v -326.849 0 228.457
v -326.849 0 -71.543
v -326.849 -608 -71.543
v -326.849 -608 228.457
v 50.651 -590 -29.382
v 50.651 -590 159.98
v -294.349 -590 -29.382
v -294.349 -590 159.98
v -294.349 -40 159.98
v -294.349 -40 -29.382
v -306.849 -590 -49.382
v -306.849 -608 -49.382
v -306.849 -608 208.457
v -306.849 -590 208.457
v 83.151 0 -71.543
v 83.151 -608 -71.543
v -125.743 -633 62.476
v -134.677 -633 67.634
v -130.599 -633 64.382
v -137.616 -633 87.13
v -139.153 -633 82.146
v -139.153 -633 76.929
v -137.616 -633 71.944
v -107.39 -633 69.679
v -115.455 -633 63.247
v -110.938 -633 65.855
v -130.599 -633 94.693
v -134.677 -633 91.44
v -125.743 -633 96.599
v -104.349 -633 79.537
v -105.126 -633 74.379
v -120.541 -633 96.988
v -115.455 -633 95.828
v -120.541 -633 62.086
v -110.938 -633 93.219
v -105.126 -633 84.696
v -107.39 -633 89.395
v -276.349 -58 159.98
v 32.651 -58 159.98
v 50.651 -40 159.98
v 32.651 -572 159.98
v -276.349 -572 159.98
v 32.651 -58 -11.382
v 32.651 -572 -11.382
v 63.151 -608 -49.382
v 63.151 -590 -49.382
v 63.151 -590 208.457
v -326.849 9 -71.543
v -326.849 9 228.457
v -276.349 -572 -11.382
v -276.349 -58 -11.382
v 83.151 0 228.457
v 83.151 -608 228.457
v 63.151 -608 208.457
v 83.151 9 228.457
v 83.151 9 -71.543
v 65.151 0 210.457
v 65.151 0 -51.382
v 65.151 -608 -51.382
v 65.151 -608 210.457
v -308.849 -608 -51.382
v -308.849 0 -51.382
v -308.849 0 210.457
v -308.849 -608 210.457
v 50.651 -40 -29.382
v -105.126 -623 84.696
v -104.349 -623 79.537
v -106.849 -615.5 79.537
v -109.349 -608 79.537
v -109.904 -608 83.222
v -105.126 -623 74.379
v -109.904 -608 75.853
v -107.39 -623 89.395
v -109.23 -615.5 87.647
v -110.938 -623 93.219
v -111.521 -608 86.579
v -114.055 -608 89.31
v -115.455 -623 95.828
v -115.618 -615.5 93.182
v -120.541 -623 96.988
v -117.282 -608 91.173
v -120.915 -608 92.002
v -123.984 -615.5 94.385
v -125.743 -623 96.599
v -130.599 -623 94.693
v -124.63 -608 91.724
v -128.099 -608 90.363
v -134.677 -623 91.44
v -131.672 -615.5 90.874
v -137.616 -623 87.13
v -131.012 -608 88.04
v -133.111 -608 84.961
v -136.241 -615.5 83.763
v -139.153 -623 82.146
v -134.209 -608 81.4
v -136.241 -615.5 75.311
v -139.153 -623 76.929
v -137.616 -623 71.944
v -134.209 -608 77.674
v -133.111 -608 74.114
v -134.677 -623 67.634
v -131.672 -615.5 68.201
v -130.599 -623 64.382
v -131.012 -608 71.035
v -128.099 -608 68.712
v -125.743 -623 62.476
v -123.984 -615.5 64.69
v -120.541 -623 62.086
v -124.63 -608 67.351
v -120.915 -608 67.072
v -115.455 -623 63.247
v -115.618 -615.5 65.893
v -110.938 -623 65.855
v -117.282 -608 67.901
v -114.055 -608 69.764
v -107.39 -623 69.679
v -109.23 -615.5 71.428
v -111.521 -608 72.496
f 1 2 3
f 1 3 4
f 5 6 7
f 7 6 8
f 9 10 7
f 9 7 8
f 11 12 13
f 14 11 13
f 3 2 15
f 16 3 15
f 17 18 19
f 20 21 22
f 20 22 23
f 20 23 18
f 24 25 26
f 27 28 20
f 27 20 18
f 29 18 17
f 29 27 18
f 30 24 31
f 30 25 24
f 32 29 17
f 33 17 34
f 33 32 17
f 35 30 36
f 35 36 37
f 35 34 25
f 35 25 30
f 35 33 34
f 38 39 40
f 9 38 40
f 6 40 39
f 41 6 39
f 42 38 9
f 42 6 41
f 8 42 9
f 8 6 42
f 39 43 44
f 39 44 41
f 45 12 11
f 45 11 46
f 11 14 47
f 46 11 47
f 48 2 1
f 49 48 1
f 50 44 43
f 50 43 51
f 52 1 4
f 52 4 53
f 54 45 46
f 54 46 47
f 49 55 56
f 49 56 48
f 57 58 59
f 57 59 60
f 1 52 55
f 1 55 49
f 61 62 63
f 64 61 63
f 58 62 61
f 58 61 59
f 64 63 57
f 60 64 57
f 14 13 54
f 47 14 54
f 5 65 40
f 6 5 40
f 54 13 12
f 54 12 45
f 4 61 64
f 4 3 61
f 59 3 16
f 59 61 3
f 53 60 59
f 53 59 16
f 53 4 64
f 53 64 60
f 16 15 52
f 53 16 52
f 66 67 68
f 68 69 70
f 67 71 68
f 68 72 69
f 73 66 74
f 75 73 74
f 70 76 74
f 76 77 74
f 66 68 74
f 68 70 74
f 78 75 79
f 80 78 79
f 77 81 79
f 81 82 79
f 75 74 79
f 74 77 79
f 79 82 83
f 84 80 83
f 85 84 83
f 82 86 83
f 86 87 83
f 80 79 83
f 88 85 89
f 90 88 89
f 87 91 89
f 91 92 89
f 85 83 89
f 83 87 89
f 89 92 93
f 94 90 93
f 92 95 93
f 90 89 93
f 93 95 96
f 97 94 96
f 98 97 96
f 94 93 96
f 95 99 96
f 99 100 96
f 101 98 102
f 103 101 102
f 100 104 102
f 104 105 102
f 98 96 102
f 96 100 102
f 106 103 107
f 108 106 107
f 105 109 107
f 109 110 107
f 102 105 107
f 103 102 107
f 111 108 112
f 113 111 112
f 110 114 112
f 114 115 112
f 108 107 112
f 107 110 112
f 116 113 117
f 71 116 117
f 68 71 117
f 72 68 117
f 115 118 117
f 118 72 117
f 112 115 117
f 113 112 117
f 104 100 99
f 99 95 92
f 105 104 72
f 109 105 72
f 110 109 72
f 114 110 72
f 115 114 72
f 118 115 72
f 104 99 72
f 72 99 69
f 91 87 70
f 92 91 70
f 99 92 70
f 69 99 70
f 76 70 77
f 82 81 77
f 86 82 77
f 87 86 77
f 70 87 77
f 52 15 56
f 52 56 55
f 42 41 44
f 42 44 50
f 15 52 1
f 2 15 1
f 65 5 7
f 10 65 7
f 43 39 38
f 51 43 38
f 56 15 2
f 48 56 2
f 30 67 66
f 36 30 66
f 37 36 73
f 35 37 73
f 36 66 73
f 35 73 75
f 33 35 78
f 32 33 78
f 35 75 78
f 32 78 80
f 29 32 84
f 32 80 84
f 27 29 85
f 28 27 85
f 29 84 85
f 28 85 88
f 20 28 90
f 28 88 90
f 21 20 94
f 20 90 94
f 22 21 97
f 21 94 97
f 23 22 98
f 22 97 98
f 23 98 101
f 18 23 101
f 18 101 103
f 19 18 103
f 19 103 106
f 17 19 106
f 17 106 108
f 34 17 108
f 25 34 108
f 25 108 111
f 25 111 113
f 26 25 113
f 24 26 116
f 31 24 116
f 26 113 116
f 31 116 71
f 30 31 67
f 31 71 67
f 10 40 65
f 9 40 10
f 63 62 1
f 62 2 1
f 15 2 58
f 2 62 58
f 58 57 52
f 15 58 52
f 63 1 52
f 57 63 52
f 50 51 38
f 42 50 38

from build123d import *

# Parameters (mm, degrees)
F0_W      = 410
F0_H      = 300
F0_W_2    = 374
F0_H_2    = 261.838547
F1_DEPTH  = 608
F2_W      = 410
F2_H      = 300
F3_DEPTH  = 9
F4_W      = 370
F4_H      = 257.838547
F5_DEPTH  = 18
F6_W      = 345
F6_H      = 189.362255
F7_DEPTH  = 550
F8_T      = -18
F9_R      = 17.5
F10_DEPTH = 25
F11_SIZE2 = 5
F11_SIZE  = 15


with BuildPart() as f1:
    # F0 (on Front) → F1 (new body)
    with BuildSketch(Plane.XZ):
        with Locations((-121.848952, 78.456648)):
            Rectangle(F0_W, F0_H)
        with Locations((-121.848952, 79.537374)):
            Rectangle(F0_W_2, F0_H_2, mode=Mode.SUBTRACT)
    extrude(amount=F1_DEPTH)


with BuildPart() as f3:
    # F2 (on face) → F3 (new body)
    with BuildSketch(Plane(origin=(0, 0, 0), x_dir=(-1, 0, 0), z_dir=(0, 1, 0))):
        with Locations((121.848952, 78.456648)):
            Rectangle(F2_W, F2_H)
    extrude(amount=F3_DEPTH)


with BuildPart() as f5:
    # F4 (on face) → F5 (new body)
    with BuildSketch(Plane.XZ.offset(608)):
        with Locations((-121.848952, 79.537374)):
            Rectangle(F4_W, F4_H)
    extrude(amount=-F5_DEPTH)


with BuildPart() as f7:
    # F6 (on face) → F7 (new body)
    with BuildSketch(Plane(origin=(0, -590, 0), x_dir=(-1, 0, 0), z_dir=(0, 1, 0))):
        with Locations((121.848952, 65.299228)):
            Rectangle(F6_W, F6_H)
    extrude(amount=F7_DEPTH)

    # F8
    f8_openings = [f7.faces().sort_by_distance(p)[0] for p in [
        (-121.848952, -315, 159.980356),
    ]]
    offset(amount=F8_T, openings=f8_openings)


with BuildPart() as f10:
    # F9 (on face) → F10 (new body)
    with BuildSketch(Plane.XZ.offset(608)):
        with Locations((-121.848952, 79.537374)):
            Circle(F9_R)
    extrude(amount=F10_DEPTH)

    # F11
    f11_edges = [f10.edges().sort_by_distance(p)[0] for p in [
        (-139.348952, -608, 79.537374),
    ]]
    chamfer(f11_edges, length=F11_SIZE, length2=F11_SIZE2)


solid = Compound([f1.part, f3.part, f5.part, f7.part, f10.part])
